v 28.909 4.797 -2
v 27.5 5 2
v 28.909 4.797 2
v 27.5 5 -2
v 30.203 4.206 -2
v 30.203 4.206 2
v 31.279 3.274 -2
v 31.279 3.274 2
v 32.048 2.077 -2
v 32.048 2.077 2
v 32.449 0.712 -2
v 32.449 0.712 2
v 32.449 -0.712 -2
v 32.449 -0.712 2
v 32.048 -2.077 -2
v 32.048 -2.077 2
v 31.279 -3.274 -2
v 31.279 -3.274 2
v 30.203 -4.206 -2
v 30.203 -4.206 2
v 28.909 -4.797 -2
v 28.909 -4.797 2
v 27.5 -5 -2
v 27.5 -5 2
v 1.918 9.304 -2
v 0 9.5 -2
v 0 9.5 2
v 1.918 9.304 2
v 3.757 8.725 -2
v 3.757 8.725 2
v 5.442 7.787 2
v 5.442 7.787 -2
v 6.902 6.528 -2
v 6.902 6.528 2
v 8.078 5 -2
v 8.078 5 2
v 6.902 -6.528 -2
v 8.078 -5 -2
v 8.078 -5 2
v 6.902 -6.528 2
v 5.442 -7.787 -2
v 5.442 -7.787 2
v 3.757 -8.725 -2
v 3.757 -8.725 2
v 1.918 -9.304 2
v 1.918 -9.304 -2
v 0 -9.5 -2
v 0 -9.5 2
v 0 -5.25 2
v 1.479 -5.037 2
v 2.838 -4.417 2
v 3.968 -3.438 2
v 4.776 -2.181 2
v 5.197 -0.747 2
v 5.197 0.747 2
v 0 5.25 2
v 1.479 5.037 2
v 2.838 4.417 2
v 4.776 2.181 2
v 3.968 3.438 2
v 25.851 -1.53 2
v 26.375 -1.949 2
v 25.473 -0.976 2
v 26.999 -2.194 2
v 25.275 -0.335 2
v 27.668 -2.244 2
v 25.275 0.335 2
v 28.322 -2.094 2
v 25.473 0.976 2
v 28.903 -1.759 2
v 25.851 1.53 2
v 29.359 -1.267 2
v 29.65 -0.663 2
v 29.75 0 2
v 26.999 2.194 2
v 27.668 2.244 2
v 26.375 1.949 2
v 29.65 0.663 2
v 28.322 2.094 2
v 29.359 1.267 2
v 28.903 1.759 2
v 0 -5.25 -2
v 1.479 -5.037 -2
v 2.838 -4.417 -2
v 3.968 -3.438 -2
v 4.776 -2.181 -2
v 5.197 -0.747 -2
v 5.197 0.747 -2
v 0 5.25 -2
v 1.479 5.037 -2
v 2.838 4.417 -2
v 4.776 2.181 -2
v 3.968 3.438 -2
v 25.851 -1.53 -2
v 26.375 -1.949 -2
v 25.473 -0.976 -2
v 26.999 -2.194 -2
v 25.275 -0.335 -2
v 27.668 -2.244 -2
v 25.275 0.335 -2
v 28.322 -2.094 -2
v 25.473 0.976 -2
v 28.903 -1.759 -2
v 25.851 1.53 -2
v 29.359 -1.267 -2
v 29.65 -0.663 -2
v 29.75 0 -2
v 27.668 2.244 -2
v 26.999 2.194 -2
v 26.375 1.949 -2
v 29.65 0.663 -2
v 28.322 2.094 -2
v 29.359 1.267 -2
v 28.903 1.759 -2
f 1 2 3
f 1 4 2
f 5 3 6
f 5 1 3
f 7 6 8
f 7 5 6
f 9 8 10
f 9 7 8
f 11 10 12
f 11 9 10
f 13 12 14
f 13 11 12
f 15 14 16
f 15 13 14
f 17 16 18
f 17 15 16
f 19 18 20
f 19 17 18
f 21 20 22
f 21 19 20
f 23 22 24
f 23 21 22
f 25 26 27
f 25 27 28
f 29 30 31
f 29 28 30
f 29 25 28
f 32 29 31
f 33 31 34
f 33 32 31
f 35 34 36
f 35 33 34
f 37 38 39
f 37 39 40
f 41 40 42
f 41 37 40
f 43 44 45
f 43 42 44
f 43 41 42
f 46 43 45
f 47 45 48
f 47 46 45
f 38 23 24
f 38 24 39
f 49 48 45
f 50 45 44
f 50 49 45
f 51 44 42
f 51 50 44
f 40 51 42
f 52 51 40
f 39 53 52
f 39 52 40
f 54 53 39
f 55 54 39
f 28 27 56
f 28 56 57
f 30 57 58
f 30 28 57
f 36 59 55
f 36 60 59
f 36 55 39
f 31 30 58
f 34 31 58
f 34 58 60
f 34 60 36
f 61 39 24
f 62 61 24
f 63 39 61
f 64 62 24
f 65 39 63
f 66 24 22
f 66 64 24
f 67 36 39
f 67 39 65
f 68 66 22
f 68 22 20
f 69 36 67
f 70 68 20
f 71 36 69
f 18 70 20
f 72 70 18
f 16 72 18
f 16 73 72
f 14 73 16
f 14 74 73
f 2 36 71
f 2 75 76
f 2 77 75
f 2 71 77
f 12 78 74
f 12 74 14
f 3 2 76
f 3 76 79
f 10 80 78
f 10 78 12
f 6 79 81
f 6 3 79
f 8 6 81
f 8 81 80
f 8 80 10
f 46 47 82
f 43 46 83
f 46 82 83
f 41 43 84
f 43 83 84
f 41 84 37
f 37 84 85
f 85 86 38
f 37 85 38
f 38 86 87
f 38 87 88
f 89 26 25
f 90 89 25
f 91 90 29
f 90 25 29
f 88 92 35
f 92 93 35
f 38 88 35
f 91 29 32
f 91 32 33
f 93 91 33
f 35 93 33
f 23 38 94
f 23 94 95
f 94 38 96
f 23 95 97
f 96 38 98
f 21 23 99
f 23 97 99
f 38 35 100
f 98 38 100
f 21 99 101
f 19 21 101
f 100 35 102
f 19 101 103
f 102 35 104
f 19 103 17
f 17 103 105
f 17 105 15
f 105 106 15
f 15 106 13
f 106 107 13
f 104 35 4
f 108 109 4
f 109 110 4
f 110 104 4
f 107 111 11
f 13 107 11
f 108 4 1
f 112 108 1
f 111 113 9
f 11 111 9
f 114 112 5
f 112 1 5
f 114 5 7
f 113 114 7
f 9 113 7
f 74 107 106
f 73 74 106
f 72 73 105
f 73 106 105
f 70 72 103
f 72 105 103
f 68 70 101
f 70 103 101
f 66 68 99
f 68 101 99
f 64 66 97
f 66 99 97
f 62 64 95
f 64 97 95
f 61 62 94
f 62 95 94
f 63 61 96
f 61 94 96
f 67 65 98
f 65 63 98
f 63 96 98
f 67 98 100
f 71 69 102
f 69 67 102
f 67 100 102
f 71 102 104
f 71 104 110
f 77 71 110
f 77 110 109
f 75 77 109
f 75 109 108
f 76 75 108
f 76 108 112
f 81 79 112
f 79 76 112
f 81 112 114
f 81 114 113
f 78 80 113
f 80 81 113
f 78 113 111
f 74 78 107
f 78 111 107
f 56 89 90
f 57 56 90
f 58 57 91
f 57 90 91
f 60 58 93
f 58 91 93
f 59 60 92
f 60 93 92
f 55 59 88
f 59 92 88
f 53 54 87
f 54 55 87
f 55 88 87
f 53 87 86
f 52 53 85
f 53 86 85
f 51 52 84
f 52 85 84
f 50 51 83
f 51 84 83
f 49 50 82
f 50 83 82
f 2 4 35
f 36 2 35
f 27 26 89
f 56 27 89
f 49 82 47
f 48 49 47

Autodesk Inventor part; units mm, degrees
ref_plane "YZ Plane" through (0, 0, 0) normal (1, 0, 0) x (0, 1, 0)
ref_plane "XZ Plane" through (0, 0, 0) normal (0, 1, 0) x (-1, 0, 0)
ref_plane "XY Plane" through (0, 0, 0) normal (0, 0, 1) x (1, 0, 0)
sketch "Sketch1" plane through (0, 0, 0) normal (0, 0, 1) x (1, 0, 0)
  arc A0 (0, -5.25) -> (0, 5.25) centre (0, 0) ccw
  arc A1 (8.0777, 5) -> (0, 9.5) centre (0, 0) ccw
  line L0 (0, 0) -> (27.5, 0) construction
  arc A2 (27.5, 5) -> (27.5, -5) centre (27.5, 0) ccw construction
  line L1 (0, 9.5) -> (0, 5.25)
  line L2 (27.5, 5) -> (8.0777, 5)
  line L3 (27.5, -5) -> (8.0777, -5)
  arc A3 (27.5, -5) -> (27.5, 5) centre (27.5, 0) ccw
  circle A4 centre (27.5, 0) radius 2.25
  arc A5 (0, 9.5) -> (0, -9.5) centre (0, 0) ccw construction
  arc A6 (0, -9.5) -> (8.0777, -5) centre (0, 0) ccw
  arc A7 (0, 5.25) -> (0, -5.25) centre (0, 0) ccw construction
  line L4 (0, 5.25) -> (0, -5.25) construction
  line L5 (0, -5.25) -> (0, -9.5)
  dimension "d2" = 10
  dimension "d4" = 4.5
  dimension "d5" = 5.25
  dimension "d6" = 9.5
  dimension "d7" = 27.5
extrude "Extrusion1" add sketch "Sketch1" along normal mid plane 4
properties part number "garfo-1"
